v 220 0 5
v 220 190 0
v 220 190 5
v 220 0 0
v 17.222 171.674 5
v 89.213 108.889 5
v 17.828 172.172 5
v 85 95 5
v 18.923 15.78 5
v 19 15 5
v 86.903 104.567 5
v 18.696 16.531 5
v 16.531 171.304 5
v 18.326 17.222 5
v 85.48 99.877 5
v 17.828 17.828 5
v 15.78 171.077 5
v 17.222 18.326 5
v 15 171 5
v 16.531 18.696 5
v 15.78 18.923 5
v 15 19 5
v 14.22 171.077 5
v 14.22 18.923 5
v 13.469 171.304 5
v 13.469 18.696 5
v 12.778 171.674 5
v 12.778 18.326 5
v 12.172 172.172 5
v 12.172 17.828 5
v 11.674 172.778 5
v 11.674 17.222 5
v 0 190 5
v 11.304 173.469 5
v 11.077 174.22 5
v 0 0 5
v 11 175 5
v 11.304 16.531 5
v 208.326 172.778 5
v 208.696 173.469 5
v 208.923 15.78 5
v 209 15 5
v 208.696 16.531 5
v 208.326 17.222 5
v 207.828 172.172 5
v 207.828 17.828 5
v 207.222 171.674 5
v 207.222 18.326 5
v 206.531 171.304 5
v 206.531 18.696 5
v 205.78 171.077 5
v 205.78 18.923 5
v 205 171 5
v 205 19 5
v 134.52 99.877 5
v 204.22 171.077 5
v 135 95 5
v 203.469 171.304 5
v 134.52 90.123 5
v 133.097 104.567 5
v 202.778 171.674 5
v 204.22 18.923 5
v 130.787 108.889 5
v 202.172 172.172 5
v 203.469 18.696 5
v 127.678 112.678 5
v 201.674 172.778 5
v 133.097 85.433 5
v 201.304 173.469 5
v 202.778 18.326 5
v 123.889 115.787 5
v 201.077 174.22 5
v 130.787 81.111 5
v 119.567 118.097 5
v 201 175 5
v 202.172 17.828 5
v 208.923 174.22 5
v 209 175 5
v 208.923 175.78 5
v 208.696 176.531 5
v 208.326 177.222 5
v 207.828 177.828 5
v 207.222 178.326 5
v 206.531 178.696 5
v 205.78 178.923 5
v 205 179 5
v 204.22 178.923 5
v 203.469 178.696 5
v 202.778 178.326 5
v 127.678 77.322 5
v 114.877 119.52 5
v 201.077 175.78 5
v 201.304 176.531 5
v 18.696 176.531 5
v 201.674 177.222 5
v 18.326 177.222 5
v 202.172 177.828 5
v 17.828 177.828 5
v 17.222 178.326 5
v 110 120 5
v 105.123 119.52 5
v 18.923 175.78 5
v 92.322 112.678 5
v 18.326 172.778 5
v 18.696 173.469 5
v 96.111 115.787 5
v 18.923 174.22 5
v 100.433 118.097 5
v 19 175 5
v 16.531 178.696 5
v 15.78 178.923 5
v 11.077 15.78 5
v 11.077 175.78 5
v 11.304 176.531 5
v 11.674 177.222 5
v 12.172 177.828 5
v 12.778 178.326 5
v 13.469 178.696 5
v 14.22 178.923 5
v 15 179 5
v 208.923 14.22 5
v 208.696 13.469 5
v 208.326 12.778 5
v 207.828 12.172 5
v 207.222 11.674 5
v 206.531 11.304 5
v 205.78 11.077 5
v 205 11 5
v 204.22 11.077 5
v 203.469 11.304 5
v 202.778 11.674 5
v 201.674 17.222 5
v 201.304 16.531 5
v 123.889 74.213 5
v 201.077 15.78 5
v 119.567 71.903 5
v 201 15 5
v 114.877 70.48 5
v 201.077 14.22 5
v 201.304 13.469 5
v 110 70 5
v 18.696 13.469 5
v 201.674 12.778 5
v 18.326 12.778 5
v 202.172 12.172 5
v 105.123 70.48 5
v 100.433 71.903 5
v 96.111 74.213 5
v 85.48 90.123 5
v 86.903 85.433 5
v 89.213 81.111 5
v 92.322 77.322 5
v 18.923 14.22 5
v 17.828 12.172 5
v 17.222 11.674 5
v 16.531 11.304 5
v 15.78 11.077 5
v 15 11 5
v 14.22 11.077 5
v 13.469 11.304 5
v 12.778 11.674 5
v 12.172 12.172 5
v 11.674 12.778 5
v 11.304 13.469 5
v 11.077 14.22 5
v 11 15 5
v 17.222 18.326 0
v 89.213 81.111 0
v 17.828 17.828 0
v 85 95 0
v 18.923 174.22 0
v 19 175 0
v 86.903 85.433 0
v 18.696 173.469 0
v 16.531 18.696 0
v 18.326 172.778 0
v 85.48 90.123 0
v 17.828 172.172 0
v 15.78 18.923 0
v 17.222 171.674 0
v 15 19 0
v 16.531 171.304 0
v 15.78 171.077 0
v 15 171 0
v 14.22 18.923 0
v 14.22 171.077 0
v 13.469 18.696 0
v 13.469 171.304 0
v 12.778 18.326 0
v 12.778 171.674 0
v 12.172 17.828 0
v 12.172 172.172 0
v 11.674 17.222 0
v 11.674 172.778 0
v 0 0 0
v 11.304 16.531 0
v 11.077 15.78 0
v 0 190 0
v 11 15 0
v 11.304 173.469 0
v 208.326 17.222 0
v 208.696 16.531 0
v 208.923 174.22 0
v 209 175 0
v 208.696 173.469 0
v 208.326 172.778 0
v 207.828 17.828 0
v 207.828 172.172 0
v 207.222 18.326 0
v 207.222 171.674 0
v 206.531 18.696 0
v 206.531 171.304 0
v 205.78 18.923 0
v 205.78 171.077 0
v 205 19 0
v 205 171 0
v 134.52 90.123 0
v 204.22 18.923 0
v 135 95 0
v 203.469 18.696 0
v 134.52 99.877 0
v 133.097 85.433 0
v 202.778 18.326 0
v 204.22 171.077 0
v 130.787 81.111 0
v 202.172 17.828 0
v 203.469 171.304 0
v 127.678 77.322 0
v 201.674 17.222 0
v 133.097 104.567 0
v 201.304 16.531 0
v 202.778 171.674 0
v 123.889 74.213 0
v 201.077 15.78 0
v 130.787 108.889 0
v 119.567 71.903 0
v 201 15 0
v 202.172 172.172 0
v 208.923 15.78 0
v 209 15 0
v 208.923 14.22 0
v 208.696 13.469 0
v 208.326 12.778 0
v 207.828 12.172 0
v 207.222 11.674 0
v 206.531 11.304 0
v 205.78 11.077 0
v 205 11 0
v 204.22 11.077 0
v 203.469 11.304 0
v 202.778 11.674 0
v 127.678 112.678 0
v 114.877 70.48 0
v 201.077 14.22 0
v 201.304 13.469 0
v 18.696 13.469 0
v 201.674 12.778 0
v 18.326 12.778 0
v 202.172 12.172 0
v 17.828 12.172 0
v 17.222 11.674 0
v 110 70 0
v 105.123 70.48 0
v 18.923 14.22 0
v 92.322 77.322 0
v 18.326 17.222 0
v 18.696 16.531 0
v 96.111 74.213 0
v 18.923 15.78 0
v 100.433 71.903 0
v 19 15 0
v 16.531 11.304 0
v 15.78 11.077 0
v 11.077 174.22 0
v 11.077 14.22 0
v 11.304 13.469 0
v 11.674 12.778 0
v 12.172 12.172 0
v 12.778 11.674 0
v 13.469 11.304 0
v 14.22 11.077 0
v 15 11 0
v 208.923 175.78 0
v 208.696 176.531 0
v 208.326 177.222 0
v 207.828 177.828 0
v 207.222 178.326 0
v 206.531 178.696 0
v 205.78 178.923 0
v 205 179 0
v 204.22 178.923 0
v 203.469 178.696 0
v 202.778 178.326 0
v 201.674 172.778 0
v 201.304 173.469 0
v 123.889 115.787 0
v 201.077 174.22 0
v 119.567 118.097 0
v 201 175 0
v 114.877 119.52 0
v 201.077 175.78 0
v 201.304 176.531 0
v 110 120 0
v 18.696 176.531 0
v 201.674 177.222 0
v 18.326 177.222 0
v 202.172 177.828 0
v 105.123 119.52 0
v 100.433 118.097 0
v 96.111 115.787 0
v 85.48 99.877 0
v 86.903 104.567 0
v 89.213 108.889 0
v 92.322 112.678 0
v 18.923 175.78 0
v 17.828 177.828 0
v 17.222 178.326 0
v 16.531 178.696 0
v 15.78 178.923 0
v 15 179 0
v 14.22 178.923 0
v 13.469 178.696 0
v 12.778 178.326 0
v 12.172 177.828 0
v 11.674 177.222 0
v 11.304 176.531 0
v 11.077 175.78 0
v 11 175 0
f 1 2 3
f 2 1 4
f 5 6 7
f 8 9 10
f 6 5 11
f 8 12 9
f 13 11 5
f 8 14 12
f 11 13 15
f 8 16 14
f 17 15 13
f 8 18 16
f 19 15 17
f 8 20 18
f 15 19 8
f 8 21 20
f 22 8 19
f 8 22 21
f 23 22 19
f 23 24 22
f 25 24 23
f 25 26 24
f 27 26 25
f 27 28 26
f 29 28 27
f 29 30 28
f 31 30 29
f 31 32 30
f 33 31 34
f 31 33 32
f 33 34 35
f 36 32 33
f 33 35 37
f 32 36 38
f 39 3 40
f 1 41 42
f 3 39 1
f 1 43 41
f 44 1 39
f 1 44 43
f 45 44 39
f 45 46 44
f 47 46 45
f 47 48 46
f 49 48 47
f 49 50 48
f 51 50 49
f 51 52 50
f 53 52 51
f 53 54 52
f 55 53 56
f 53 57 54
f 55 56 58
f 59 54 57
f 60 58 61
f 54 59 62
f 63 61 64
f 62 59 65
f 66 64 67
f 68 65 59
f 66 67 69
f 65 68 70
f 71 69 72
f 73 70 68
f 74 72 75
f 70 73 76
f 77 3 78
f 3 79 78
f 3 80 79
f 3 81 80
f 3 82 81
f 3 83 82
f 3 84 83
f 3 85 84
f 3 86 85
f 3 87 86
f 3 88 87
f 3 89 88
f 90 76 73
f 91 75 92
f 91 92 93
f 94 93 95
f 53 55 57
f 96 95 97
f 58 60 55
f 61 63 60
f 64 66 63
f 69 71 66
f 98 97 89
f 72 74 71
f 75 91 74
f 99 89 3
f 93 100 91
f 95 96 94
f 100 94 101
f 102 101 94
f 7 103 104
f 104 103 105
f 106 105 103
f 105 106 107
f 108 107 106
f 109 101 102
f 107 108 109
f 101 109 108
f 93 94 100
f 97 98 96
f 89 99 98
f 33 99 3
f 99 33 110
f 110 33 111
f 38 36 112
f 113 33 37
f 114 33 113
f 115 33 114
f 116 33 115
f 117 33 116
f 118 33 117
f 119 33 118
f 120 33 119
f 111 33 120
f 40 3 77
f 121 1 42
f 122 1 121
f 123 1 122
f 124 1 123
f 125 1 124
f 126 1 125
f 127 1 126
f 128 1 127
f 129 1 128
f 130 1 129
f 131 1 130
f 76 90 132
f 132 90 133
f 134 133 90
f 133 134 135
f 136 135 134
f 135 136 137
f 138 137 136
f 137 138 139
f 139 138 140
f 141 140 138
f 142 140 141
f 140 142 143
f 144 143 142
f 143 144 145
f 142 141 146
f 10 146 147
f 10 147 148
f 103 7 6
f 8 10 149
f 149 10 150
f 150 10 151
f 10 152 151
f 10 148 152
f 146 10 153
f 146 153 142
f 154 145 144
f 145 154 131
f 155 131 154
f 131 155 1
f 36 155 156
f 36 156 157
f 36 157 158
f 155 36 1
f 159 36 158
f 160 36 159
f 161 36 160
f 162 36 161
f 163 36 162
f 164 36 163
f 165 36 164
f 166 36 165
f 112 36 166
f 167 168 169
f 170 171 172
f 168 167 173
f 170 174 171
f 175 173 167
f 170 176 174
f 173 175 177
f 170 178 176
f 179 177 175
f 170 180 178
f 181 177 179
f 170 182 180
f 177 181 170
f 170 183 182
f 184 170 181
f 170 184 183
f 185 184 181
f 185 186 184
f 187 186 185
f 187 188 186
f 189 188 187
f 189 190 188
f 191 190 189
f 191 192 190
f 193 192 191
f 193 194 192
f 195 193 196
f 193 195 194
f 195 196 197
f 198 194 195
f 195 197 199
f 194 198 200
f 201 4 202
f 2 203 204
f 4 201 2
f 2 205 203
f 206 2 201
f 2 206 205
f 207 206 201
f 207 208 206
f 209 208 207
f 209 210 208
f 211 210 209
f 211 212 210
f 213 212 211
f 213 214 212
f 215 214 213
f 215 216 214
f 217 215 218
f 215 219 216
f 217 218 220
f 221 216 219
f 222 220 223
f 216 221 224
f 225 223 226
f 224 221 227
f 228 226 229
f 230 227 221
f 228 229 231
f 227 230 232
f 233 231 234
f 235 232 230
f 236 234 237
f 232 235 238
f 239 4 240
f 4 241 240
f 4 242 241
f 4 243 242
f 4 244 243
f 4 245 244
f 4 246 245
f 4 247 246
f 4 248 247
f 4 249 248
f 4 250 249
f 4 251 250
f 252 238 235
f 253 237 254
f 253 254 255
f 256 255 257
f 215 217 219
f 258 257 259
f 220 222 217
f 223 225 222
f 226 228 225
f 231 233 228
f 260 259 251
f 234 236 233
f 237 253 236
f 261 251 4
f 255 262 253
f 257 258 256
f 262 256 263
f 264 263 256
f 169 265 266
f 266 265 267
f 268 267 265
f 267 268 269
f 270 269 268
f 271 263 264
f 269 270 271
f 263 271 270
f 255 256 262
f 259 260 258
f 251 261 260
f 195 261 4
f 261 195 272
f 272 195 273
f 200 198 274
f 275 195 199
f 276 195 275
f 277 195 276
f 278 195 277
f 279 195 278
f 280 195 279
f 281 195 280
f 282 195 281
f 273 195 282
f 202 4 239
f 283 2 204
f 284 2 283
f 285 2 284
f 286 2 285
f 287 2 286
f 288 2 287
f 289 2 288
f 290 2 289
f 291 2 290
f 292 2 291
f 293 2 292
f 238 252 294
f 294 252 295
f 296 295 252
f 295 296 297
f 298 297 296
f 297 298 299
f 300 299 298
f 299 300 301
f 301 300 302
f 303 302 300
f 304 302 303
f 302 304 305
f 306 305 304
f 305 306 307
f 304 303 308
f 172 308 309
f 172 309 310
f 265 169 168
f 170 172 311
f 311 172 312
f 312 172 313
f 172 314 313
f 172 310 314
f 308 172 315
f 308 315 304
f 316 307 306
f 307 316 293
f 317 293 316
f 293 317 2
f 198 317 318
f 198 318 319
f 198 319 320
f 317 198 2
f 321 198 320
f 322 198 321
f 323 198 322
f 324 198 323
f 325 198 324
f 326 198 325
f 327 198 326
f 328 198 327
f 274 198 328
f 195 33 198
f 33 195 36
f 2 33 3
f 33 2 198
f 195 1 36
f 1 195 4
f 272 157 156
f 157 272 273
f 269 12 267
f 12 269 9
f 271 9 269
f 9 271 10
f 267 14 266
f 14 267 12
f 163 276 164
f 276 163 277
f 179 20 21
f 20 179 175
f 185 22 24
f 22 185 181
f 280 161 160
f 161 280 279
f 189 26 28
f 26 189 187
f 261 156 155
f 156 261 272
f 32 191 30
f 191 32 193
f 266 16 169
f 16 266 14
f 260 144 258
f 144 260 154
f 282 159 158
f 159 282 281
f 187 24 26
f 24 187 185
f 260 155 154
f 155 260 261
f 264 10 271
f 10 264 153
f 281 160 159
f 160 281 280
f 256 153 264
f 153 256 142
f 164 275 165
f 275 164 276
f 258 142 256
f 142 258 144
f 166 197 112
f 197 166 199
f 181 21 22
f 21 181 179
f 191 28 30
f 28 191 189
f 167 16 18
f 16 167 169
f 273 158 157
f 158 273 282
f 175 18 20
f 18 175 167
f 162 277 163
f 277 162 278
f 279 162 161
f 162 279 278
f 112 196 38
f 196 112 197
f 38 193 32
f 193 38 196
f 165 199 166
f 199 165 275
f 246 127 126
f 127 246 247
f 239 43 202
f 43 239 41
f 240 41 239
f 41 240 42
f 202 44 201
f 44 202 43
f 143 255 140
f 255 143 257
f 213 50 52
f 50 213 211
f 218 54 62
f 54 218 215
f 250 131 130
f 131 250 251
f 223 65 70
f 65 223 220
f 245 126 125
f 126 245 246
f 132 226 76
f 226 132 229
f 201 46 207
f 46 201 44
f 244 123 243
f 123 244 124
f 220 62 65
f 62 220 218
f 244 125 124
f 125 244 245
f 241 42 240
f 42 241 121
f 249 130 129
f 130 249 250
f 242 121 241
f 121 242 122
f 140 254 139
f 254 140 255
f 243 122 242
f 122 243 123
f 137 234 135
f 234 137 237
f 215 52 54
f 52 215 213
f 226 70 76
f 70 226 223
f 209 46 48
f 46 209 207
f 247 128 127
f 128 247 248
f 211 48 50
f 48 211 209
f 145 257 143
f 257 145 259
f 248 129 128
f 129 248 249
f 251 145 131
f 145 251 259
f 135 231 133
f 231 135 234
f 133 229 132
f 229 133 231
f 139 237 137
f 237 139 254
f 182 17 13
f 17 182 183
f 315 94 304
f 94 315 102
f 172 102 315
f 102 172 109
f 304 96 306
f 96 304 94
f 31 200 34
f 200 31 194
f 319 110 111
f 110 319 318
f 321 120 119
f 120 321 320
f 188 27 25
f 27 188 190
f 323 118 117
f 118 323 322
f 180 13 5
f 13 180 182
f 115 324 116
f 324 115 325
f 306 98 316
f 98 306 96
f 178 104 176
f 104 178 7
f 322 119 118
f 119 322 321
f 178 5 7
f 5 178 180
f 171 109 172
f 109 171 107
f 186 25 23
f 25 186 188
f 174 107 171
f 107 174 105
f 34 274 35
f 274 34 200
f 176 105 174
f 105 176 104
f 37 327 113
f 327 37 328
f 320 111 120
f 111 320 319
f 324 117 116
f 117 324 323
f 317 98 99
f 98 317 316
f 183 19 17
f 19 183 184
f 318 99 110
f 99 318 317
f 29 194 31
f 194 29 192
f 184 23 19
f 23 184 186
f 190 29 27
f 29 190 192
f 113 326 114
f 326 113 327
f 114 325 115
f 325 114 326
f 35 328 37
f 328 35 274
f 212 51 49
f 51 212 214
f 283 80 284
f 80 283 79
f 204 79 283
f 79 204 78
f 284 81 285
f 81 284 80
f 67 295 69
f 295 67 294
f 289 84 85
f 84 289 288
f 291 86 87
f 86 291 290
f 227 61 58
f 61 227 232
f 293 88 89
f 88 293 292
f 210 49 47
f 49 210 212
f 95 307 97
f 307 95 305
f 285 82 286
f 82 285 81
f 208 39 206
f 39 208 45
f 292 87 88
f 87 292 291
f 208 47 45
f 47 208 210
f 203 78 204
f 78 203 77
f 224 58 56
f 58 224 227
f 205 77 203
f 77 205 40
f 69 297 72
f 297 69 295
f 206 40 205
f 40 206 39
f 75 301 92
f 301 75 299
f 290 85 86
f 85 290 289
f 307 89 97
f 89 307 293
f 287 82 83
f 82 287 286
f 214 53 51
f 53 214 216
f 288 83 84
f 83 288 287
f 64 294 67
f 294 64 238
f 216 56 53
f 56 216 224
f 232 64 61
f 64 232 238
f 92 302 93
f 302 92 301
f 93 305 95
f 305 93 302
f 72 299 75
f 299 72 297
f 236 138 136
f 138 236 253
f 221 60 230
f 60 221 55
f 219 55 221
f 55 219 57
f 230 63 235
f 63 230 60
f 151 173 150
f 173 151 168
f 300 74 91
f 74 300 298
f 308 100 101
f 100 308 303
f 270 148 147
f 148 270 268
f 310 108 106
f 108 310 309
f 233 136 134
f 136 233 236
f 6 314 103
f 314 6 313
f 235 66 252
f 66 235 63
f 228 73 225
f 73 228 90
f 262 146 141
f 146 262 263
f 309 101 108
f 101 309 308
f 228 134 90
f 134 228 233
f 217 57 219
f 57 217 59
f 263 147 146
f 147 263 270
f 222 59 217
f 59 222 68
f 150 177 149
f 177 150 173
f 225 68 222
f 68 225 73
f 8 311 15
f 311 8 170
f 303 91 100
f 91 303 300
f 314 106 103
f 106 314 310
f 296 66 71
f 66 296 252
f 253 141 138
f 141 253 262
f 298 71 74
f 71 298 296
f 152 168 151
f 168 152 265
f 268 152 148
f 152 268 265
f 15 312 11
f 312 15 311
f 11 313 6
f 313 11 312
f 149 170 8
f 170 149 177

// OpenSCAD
$fn = 32;

// ----------------------------------------------------------------------
// Big plate: 200-250 mm adapter plate
// ----------------------------------------------------------------------

// --- parameters (mm) ---
plate_l = 220;            // plate length, X
plate_w = 190;            // plate width, Y
plate_t = 5;              // plate thickness, Z
corner_d = 8;             // corner hole diameter
corner_in = 15;           // corner hole inset from the edges
bore_d = 50;              // central bore
fit_tol = 0.05;           // tolerance for press fits, mm
free_tol = 0.3;           // tolerance for clearance fits, mm

difference() {
  cube([plate_l, plate_w, plate_t]);
  translate([corner_in, corner_in, -1]) cylinder(h = plate_t + 2, d = corner_d);
  translate([plate_l - corner_in, corner_in, -1]) cylinder(h = plate_t + 2, d = corner_d);
  translate([corner_in, plate_w - corner_in, -1]) cylinder(h = plate_t + 2, d = corner_d);
  translate([plate_l - corner_in, plate_w - corner_in, -1]) cylinder(h = plate_t + 2, d = corner_d);
  translate([plate_l / 2, plate_w / 2, -1]) cylinder(h = plate_t + 2, d = bore_d);
}
